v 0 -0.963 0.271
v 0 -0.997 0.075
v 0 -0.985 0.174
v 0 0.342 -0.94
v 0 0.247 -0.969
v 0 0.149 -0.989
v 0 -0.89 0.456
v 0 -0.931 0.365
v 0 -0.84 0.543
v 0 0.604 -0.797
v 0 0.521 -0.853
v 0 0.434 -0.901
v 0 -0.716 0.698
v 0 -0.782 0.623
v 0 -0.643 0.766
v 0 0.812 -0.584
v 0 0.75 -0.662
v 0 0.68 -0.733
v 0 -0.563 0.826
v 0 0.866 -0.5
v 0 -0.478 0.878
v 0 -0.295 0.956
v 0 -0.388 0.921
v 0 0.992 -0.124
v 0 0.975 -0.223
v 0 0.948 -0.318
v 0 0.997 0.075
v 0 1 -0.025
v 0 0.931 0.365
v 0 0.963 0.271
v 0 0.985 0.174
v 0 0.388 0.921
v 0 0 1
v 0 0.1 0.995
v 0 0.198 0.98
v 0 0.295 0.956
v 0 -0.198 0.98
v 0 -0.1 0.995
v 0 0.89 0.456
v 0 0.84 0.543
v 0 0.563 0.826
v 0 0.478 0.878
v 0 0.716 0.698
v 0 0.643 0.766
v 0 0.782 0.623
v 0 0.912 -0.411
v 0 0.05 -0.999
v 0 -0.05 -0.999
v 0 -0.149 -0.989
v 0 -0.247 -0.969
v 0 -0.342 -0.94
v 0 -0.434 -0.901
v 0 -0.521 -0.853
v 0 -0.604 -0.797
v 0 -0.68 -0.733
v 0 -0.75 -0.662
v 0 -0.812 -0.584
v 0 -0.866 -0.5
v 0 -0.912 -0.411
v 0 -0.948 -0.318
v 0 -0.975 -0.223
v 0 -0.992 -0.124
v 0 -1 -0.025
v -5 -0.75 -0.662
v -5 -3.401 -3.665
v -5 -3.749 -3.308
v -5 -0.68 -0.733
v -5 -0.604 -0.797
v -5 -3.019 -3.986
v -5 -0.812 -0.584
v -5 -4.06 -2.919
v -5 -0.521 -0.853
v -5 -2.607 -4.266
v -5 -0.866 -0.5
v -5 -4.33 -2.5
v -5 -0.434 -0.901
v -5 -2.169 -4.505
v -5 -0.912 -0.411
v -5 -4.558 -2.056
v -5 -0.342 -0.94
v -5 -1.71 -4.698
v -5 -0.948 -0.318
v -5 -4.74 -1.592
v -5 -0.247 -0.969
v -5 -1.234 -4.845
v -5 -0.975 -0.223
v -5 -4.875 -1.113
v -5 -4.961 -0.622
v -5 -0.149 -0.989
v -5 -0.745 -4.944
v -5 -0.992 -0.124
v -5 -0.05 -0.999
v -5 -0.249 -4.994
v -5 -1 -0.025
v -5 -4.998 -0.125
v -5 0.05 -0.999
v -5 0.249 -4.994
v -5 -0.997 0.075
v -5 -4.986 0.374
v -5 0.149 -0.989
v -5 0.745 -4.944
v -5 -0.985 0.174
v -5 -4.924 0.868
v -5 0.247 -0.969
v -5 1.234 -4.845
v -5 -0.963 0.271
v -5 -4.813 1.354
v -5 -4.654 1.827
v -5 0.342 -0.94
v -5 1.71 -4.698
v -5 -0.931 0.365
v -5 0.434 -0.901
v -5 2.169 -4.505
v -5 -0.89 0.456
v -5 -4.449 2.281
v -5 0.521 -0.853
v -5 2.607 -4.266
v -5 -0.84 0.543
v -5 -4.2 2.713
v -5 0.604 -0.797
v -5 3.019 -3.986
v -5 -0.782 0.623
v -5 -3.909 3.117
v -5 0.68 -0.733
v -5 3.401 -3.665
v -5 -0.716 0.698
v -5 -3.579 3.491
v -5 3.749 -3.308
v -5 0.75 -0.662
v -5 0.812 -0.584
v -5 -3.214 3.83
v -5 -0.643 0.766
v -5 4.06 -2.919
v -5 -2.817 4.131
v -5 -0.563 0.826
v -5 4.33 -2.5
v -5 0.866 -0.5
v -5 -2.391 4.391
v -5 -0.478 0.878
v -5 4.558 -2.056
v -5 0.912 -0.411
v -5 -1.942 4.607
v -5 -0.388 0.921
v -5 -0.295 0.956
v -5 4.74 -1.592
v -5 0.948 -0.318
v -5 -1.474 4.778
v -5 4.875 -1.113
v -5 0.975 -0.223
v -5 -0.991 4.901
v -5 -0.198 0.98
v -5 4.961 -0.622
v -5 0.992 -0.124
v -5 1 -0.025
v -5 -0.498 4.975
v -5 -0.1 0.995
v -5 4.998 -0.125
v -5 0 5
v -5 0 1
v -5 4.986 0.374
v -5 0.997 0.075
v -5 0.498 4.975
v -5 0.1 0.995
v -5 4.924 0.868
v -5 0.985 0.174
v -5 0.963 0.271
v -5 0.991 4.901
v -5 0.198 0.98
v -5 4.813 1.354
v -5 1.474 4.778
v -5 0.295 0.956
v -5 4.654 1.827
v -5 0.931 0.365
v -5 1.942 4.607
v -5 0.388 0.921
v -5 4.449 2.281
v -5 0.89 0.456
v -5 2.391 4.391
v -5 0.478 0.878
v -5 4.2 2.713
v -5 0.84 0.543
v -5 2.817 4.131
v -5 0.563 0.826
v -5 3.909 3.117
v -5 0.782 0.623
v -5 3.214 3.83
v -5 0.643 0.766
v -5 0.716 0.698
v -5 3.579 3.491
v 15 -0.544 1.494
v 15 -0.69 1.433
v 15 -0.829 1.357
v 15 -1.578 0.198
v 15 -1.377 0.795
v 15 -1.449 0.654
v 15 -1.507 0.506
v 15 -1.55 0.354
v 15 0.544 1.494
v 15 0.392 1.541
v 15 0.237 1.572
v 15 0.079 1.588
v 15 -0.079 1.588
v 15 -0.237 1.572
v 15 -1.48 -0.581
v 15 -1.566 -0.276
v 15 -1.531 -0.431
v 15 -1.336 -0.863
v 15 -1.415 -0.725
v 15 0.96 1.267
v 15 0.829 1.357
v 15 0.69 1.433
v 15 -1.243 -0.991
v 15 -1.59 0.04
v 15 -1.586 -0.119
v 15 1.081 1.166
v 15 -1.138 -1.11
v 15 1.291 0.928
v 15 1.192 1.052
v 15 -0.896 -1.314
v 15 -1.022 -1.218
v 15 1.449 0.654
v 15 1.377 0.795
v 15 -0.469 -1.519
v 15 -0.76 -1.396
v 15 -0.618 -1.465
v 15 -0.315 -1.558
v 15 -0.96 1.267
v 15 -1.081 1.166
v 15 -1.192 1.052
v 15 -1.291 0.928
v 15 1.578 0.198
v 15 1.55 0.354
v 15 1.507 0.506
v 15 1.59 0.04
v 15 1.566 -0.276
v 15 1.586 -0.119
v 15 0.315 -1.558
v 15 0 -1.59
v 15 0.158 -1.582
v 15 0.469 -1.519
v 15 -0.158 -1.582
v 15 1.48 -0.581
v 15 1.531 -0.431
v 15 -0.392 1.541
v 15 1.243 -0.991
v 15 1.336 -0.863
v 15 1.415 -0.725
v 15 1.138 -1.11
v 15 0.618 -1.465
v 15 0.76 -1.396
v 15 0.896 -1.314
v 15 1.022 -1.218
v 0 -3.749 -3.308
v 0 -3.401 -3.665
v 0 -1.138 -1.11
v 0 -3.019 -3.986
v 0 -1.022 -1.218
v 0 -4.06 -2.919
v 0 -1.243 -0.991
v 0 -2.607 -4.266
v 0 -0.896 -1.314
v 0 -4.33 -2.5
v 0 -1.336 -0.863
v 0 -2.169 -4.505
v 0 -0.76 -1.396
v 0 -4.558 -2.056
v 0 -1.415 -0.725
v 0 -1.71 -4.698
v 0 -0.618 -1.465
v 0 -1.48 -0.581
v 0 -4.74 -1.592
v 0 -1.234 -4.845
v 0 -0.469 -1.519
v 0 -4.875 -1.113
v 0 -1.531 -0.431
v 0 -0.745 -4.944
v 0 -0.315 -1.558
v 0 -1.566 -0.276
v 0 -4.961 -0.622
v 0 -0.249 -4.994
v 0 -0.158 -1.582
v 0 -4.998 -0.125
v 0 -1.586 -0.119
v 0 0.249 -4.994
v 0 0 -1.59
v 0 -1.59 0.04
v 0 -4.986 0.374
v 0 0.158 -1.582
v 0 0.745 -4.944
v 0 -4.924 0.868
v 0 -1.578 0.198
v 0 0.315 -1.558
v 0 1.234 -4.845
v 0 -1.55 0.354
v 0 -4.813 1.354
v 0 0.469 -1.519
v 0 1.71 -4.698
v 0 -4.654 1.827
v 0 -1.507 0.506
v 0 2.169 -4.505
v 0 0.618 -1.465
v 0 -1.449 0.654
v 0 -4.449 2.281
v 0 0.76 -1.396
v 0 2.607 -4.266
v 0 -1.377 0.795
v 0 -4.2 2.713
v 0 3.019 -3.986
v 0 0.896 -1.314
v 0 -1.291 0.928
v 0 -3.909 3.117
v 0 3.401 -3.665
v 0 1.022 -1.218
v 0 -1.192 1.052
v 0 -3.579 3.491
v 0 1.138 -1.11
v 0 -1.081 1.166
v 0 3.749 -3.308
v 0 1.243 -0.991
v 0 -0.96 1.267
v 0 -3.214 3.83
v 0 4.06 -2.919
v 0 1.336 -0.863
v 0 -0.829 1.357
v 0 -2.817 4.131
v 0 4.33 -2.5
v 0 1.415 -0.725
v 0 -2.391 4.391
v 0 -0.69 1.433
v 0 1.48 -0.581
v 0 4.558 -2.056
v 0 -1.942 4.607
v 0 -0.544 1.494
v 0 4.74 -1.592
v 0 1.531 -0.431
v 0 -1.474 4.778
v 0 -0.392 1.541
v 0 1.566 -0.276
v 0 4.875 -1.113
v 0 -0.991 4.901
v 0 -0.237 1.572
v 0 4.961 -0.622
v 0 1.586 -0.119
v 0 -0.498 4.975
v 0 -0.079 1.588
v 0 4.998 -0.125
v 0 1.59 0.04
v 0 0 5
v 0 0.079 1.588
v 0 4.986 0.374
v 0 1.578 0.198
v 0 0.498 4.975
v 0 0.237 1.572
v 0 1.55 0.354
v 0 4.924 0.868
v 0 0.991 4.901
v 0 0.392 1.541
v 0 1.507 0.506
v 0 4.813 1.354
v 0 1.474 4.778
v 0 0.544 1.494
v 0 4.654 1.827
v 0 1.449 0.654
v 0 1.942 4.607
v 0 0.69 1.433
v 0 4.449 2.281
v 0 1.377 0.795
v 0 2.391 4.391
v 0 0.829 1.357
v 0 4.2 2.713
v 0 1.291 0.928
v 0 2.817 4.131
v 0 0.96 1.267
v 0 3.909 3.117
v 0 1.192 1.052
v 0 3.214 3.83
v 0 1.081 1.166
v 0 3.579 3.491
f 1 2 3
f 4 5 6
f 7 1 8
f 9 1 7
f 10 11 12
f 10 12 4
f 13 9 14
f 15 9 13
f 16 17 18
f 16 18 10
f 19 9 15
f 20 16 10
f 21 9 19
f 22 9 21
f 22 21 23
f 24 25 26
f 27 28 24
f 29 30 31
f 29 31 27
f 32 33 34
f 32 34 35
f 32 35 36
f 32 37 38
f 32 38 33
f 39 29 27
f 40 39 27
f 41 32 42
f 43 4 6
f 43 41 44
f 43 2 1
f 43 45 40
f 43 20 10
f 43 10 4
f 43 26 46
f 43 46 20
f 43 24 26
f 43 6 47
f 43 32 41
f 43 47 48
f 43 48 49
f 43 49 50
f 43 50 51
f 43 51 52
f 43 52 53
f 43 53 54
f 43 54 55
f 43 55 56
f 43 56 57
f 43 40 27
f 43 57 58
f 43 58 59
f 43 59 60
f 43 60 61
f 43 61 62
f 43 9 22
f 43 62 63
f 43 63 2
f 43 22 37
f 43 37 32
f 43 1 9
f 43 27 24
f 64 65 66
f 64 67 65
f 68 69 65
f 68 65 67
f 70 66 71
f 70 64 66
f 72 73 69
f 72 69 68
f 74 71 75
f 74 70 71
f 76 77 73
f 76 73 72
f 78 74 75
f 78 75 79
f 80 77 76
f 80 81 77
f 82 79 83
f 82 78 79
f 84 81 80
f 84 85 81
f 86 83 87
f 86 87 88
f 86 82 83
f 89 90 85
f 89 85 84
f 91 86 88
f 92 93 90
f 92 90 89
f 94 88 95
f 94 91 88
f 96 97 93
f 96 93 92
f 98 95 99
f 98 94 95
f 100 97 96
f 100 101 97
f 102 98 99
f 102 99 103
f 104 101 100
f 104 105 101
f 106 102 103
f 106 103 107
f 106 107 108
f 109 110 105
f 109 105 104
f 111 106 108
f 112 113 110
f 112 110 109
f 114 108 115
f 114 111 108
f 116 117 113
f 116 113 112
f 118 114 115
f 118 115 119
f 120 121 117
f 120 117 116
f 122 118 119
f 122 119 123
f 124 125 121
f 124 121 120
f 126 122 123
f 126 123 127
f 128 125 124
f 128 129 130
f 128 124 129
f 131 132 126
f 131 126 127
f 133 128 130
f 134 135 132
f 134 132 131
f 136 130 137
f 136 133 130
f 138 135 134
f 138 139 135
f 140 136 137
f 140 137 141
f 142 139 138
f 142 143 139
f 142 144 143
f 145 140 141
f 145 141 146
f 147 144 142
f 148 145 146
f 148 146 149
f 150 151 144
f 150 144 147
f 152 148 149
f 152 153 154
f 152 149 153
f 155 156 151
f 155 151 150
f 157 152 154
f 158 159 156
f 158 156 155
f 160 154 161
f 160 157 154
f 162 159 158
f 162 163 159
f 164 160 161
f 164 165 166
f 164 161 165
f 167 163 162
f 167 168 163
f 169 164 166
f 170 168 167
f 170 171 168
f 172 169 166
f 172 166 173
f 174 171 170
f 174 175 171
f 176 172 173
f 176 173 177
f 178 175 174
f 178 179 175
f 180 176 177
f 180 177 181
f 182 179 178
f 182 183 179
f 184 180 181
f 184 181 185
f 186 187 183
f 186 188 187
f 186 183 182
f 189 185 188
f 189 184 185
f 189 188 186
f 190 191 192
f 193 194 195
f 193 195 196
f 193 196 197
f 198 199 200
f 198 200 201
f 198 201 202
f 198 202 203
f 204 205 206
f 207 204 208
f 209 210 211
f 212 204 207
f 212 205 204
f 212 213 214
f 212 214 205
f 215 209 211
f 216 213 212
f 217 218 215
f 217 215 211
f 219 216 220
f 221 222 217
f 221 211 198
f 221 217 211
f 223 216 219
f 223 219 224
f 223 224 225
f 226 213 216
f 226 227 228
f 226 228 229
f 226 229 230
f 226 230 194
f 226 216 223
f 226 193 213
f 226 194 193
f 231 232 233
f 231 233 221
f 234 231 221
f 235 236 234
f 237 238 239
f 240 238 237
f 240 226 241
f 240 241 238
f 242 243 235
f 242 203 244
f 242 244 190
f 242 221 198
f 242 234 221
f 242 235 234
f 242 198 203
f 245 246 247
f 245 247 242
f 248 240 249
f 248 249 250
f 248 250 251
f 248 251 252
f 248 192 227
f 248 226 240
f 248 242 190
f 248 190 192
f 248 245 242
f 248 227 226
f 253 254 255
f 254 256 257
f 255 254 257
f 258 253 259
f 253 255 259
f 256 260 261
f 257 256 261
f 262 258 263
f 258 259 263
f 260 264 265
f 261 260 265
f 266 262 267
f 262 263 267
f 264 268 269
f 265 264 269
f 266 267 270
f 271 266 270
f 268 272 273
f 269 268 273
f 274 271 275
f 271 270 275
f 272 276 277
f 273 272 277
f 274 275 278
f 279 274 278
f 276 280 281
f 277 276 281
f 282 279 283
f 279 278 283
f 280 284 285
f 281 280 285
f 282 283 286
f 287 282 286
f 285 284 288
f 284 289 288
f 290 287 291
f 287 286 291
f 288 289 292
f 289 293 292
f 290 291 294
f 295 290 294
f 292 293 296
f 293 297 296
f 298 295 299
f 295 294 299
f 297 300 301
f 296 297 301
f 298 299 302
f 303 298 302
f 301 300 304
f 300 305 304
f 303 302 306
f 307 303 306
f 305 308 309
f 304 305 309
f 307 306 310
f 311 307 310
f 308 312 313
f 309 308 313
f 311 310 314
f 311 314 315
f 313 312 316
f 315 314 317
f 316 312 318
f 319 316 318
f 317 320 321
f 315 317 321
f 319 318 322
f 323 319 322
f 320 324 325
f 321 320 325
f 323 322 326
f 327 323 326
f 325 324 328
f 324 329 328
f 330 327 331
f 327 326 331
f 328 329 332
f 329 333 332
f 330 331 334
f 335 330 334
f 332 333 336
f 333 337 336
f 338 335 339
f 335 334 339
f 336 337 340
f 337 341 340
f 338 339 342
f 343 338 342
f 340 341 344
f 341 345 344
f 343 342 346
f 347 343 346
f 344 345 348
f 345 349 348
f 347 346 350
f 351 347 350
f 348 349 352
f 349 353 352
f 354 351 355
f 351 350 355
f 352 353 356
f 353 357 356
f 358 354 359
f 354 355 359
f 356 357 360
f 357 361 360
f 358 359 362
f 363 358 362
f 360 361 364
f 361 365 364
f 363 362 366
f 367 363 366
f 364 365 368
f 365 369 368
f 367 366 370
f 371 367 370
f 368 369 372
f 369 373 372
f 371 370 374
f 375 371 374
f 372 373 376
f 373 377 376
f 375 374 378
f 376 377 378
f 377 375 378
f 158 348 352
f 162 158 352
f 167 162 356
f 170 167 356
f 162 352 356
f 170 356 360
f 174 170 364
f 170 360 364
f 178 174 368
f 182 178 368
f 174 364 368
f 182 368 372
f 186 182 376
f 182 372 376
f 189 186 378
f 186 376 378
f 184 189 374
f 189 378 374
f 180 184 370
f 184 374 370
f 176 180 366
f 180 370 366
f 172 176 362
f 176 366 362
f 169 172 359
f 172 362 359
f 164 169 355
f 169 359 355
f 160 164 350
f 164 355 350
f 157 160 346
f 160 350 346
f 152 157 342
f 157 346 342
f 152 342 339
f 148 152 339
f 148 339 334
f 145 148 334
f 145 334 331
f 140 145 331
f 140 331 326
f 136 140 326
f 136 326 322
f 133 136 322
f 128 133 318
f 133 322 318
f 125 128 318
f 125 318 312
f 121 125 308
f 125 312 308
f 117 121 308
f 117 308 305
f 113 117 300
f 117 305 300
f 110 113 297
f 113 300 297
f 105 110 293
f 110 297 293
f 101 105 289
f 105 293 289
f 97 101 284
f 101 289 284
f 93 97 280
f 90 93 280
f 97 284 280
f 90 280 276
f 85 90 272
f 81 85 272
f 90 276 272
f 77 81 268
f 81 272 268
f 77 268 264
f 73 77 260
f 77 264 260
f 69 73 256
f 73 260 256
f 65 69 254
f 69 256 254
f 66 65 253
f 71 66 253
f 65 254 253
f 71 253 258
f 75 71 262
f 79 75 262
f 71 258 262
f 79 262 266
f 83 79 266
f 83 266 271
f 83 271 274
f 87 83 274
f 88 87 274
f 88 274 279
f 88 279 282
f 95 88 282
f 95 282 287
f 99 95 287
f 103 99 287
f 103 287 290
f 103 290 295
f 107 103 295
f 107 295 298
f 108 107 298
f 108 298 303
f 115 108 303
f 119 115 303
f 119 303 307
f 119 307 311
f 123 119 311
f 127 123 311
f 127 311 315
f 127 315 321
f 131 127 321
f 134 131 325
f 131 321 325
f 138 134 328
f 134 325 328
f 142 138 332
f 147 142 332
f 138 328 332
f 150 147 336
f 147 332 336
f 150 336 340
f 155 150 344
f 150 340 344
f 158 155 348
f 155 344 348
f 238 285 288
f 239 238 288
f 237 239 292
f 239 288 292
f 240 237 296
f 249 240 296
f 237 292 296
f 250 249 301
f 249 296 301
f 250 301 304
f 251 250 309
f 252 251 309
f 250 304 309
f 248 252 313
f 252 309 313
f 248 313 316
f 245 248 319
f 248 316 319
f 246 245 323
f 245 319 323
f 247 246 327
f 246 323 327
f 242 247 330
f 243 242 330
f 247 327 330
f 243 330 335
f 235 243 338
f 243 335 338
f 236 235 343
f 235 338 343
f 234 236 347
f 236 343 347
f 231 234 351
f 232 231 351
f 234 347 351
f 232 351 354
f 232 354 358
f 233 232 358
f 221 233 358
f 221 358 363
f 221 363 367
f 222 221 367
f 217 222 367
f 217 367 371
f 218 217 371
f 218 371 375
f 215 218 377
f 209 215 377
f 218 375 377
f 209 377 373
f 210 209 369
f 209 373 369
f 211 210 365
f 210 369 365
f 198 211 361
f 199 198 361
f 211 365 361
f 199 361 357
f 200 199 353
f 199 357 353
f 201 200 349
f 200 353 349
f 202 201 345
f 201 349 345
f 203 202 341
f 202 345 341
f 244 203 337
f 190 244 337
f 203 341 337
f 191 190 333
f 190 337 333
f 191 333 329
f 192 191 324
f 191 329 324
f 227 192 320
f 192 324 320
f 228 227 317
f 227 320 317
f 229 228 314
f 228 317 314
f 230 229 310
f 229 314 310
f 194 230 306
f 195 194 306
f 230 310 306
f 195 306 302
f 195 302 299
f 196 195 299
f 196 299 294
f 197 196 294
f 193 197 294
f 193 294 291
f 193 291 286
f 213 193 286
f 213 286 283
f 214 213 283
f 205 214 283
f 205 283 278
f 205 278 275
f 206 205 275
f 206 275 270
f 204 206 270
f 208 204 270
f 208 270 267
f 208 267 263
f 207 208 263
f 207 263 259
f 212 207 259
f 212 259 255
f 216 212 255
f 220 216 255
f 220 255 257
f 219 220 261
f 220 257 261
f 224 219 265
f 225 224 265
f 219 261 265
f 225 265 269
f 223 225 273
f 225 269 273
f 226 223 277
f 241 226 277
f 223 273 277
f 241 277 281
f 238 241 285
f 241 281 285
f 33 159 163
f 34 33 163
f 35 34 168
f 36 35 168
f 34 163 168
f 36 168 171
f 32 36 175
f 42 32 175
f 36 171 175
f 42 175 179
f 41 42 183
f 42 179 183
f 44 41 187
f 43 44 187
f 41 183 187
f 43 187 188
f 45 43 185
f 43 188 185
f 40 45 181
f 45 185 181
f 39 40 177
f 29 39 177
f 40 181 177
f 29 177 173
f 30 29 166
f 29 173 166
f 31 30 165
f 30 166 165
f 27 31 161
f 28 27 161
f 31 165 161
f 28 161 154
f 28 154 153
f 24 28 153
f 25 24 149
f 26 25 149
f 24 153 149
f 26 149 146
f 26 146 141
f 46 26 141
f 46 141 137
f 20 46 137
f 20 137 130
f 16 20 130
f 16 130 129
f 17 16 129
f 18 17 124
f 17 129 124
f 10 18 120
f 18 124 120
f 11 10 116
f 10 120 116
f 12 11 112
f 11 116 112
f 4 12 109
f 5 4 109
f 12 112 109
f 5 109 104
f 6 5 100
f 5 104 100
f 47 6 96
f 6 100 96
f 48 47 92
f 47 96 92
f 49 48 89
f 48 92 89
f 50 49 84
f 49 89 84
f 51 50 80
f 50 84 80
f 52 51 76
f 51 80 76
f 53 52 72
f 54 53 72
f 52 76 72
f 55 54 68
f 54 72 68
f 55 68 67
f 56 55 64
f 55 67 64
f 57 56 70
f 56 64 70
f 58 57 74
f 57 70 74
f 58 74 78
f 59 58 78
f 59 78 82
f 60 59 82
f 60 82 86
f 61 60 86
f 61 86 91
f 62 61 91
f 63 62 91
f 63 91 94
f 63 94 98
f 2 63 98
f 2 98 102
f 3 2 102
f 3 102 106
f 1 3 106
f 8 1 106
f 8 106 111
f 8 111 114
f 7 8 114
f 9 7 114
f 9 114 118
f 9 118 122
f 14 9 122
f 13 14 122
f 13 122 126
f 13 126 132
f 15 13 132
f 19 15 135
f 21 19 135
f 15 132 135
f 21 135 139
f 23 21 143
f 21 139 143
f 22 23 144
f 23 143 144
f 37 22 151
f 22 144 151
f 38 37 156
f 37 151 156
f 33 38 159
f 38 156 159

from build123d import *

# Parameters (mm, degrees)
ESBO_O1_R                = 1.59
RESSALTO_EXTRUS_O1_DEPTH = 15
ESBO_O3_R                = 5
RESSALTO_EXTRUS_O5_DEPTH = 5
ESBO_O8_R                = 1
CORTE_EXTRUS_O1_DEPTH    = 5


with BuildPart() as part:
    # Esboço1 → Ressalto-extrusão1 (new body)
    with BuildSketch(Plane(origin=(0, 0, 0), x_dir=(0, 0, -1), z_dir=(1, 0, 0))):
        Circle(ESBO_O1_R)
    extrude(amount=RESSALTO_EXTRUS_O1_DEPTH)

    # Esboço3 → Ressalto-extrusão5 (add)
    with BuildSketch(Plane.ZY):
        Circle(ESBO_O3_R)
    extrude(amount=RESSALTO_EXTRUS_O5_DEPTH)

    # Esboço8 → Corte-extrusão1 (cut)
    with BuildSketch(Plane.ZY.offset(5)):
        Circle(ESBO_O8_R)
    extrude(amount=-CORTE_EXTRUS_O1_DEPTH, mode=Mode.SUBTRACT)


solid = part.part
